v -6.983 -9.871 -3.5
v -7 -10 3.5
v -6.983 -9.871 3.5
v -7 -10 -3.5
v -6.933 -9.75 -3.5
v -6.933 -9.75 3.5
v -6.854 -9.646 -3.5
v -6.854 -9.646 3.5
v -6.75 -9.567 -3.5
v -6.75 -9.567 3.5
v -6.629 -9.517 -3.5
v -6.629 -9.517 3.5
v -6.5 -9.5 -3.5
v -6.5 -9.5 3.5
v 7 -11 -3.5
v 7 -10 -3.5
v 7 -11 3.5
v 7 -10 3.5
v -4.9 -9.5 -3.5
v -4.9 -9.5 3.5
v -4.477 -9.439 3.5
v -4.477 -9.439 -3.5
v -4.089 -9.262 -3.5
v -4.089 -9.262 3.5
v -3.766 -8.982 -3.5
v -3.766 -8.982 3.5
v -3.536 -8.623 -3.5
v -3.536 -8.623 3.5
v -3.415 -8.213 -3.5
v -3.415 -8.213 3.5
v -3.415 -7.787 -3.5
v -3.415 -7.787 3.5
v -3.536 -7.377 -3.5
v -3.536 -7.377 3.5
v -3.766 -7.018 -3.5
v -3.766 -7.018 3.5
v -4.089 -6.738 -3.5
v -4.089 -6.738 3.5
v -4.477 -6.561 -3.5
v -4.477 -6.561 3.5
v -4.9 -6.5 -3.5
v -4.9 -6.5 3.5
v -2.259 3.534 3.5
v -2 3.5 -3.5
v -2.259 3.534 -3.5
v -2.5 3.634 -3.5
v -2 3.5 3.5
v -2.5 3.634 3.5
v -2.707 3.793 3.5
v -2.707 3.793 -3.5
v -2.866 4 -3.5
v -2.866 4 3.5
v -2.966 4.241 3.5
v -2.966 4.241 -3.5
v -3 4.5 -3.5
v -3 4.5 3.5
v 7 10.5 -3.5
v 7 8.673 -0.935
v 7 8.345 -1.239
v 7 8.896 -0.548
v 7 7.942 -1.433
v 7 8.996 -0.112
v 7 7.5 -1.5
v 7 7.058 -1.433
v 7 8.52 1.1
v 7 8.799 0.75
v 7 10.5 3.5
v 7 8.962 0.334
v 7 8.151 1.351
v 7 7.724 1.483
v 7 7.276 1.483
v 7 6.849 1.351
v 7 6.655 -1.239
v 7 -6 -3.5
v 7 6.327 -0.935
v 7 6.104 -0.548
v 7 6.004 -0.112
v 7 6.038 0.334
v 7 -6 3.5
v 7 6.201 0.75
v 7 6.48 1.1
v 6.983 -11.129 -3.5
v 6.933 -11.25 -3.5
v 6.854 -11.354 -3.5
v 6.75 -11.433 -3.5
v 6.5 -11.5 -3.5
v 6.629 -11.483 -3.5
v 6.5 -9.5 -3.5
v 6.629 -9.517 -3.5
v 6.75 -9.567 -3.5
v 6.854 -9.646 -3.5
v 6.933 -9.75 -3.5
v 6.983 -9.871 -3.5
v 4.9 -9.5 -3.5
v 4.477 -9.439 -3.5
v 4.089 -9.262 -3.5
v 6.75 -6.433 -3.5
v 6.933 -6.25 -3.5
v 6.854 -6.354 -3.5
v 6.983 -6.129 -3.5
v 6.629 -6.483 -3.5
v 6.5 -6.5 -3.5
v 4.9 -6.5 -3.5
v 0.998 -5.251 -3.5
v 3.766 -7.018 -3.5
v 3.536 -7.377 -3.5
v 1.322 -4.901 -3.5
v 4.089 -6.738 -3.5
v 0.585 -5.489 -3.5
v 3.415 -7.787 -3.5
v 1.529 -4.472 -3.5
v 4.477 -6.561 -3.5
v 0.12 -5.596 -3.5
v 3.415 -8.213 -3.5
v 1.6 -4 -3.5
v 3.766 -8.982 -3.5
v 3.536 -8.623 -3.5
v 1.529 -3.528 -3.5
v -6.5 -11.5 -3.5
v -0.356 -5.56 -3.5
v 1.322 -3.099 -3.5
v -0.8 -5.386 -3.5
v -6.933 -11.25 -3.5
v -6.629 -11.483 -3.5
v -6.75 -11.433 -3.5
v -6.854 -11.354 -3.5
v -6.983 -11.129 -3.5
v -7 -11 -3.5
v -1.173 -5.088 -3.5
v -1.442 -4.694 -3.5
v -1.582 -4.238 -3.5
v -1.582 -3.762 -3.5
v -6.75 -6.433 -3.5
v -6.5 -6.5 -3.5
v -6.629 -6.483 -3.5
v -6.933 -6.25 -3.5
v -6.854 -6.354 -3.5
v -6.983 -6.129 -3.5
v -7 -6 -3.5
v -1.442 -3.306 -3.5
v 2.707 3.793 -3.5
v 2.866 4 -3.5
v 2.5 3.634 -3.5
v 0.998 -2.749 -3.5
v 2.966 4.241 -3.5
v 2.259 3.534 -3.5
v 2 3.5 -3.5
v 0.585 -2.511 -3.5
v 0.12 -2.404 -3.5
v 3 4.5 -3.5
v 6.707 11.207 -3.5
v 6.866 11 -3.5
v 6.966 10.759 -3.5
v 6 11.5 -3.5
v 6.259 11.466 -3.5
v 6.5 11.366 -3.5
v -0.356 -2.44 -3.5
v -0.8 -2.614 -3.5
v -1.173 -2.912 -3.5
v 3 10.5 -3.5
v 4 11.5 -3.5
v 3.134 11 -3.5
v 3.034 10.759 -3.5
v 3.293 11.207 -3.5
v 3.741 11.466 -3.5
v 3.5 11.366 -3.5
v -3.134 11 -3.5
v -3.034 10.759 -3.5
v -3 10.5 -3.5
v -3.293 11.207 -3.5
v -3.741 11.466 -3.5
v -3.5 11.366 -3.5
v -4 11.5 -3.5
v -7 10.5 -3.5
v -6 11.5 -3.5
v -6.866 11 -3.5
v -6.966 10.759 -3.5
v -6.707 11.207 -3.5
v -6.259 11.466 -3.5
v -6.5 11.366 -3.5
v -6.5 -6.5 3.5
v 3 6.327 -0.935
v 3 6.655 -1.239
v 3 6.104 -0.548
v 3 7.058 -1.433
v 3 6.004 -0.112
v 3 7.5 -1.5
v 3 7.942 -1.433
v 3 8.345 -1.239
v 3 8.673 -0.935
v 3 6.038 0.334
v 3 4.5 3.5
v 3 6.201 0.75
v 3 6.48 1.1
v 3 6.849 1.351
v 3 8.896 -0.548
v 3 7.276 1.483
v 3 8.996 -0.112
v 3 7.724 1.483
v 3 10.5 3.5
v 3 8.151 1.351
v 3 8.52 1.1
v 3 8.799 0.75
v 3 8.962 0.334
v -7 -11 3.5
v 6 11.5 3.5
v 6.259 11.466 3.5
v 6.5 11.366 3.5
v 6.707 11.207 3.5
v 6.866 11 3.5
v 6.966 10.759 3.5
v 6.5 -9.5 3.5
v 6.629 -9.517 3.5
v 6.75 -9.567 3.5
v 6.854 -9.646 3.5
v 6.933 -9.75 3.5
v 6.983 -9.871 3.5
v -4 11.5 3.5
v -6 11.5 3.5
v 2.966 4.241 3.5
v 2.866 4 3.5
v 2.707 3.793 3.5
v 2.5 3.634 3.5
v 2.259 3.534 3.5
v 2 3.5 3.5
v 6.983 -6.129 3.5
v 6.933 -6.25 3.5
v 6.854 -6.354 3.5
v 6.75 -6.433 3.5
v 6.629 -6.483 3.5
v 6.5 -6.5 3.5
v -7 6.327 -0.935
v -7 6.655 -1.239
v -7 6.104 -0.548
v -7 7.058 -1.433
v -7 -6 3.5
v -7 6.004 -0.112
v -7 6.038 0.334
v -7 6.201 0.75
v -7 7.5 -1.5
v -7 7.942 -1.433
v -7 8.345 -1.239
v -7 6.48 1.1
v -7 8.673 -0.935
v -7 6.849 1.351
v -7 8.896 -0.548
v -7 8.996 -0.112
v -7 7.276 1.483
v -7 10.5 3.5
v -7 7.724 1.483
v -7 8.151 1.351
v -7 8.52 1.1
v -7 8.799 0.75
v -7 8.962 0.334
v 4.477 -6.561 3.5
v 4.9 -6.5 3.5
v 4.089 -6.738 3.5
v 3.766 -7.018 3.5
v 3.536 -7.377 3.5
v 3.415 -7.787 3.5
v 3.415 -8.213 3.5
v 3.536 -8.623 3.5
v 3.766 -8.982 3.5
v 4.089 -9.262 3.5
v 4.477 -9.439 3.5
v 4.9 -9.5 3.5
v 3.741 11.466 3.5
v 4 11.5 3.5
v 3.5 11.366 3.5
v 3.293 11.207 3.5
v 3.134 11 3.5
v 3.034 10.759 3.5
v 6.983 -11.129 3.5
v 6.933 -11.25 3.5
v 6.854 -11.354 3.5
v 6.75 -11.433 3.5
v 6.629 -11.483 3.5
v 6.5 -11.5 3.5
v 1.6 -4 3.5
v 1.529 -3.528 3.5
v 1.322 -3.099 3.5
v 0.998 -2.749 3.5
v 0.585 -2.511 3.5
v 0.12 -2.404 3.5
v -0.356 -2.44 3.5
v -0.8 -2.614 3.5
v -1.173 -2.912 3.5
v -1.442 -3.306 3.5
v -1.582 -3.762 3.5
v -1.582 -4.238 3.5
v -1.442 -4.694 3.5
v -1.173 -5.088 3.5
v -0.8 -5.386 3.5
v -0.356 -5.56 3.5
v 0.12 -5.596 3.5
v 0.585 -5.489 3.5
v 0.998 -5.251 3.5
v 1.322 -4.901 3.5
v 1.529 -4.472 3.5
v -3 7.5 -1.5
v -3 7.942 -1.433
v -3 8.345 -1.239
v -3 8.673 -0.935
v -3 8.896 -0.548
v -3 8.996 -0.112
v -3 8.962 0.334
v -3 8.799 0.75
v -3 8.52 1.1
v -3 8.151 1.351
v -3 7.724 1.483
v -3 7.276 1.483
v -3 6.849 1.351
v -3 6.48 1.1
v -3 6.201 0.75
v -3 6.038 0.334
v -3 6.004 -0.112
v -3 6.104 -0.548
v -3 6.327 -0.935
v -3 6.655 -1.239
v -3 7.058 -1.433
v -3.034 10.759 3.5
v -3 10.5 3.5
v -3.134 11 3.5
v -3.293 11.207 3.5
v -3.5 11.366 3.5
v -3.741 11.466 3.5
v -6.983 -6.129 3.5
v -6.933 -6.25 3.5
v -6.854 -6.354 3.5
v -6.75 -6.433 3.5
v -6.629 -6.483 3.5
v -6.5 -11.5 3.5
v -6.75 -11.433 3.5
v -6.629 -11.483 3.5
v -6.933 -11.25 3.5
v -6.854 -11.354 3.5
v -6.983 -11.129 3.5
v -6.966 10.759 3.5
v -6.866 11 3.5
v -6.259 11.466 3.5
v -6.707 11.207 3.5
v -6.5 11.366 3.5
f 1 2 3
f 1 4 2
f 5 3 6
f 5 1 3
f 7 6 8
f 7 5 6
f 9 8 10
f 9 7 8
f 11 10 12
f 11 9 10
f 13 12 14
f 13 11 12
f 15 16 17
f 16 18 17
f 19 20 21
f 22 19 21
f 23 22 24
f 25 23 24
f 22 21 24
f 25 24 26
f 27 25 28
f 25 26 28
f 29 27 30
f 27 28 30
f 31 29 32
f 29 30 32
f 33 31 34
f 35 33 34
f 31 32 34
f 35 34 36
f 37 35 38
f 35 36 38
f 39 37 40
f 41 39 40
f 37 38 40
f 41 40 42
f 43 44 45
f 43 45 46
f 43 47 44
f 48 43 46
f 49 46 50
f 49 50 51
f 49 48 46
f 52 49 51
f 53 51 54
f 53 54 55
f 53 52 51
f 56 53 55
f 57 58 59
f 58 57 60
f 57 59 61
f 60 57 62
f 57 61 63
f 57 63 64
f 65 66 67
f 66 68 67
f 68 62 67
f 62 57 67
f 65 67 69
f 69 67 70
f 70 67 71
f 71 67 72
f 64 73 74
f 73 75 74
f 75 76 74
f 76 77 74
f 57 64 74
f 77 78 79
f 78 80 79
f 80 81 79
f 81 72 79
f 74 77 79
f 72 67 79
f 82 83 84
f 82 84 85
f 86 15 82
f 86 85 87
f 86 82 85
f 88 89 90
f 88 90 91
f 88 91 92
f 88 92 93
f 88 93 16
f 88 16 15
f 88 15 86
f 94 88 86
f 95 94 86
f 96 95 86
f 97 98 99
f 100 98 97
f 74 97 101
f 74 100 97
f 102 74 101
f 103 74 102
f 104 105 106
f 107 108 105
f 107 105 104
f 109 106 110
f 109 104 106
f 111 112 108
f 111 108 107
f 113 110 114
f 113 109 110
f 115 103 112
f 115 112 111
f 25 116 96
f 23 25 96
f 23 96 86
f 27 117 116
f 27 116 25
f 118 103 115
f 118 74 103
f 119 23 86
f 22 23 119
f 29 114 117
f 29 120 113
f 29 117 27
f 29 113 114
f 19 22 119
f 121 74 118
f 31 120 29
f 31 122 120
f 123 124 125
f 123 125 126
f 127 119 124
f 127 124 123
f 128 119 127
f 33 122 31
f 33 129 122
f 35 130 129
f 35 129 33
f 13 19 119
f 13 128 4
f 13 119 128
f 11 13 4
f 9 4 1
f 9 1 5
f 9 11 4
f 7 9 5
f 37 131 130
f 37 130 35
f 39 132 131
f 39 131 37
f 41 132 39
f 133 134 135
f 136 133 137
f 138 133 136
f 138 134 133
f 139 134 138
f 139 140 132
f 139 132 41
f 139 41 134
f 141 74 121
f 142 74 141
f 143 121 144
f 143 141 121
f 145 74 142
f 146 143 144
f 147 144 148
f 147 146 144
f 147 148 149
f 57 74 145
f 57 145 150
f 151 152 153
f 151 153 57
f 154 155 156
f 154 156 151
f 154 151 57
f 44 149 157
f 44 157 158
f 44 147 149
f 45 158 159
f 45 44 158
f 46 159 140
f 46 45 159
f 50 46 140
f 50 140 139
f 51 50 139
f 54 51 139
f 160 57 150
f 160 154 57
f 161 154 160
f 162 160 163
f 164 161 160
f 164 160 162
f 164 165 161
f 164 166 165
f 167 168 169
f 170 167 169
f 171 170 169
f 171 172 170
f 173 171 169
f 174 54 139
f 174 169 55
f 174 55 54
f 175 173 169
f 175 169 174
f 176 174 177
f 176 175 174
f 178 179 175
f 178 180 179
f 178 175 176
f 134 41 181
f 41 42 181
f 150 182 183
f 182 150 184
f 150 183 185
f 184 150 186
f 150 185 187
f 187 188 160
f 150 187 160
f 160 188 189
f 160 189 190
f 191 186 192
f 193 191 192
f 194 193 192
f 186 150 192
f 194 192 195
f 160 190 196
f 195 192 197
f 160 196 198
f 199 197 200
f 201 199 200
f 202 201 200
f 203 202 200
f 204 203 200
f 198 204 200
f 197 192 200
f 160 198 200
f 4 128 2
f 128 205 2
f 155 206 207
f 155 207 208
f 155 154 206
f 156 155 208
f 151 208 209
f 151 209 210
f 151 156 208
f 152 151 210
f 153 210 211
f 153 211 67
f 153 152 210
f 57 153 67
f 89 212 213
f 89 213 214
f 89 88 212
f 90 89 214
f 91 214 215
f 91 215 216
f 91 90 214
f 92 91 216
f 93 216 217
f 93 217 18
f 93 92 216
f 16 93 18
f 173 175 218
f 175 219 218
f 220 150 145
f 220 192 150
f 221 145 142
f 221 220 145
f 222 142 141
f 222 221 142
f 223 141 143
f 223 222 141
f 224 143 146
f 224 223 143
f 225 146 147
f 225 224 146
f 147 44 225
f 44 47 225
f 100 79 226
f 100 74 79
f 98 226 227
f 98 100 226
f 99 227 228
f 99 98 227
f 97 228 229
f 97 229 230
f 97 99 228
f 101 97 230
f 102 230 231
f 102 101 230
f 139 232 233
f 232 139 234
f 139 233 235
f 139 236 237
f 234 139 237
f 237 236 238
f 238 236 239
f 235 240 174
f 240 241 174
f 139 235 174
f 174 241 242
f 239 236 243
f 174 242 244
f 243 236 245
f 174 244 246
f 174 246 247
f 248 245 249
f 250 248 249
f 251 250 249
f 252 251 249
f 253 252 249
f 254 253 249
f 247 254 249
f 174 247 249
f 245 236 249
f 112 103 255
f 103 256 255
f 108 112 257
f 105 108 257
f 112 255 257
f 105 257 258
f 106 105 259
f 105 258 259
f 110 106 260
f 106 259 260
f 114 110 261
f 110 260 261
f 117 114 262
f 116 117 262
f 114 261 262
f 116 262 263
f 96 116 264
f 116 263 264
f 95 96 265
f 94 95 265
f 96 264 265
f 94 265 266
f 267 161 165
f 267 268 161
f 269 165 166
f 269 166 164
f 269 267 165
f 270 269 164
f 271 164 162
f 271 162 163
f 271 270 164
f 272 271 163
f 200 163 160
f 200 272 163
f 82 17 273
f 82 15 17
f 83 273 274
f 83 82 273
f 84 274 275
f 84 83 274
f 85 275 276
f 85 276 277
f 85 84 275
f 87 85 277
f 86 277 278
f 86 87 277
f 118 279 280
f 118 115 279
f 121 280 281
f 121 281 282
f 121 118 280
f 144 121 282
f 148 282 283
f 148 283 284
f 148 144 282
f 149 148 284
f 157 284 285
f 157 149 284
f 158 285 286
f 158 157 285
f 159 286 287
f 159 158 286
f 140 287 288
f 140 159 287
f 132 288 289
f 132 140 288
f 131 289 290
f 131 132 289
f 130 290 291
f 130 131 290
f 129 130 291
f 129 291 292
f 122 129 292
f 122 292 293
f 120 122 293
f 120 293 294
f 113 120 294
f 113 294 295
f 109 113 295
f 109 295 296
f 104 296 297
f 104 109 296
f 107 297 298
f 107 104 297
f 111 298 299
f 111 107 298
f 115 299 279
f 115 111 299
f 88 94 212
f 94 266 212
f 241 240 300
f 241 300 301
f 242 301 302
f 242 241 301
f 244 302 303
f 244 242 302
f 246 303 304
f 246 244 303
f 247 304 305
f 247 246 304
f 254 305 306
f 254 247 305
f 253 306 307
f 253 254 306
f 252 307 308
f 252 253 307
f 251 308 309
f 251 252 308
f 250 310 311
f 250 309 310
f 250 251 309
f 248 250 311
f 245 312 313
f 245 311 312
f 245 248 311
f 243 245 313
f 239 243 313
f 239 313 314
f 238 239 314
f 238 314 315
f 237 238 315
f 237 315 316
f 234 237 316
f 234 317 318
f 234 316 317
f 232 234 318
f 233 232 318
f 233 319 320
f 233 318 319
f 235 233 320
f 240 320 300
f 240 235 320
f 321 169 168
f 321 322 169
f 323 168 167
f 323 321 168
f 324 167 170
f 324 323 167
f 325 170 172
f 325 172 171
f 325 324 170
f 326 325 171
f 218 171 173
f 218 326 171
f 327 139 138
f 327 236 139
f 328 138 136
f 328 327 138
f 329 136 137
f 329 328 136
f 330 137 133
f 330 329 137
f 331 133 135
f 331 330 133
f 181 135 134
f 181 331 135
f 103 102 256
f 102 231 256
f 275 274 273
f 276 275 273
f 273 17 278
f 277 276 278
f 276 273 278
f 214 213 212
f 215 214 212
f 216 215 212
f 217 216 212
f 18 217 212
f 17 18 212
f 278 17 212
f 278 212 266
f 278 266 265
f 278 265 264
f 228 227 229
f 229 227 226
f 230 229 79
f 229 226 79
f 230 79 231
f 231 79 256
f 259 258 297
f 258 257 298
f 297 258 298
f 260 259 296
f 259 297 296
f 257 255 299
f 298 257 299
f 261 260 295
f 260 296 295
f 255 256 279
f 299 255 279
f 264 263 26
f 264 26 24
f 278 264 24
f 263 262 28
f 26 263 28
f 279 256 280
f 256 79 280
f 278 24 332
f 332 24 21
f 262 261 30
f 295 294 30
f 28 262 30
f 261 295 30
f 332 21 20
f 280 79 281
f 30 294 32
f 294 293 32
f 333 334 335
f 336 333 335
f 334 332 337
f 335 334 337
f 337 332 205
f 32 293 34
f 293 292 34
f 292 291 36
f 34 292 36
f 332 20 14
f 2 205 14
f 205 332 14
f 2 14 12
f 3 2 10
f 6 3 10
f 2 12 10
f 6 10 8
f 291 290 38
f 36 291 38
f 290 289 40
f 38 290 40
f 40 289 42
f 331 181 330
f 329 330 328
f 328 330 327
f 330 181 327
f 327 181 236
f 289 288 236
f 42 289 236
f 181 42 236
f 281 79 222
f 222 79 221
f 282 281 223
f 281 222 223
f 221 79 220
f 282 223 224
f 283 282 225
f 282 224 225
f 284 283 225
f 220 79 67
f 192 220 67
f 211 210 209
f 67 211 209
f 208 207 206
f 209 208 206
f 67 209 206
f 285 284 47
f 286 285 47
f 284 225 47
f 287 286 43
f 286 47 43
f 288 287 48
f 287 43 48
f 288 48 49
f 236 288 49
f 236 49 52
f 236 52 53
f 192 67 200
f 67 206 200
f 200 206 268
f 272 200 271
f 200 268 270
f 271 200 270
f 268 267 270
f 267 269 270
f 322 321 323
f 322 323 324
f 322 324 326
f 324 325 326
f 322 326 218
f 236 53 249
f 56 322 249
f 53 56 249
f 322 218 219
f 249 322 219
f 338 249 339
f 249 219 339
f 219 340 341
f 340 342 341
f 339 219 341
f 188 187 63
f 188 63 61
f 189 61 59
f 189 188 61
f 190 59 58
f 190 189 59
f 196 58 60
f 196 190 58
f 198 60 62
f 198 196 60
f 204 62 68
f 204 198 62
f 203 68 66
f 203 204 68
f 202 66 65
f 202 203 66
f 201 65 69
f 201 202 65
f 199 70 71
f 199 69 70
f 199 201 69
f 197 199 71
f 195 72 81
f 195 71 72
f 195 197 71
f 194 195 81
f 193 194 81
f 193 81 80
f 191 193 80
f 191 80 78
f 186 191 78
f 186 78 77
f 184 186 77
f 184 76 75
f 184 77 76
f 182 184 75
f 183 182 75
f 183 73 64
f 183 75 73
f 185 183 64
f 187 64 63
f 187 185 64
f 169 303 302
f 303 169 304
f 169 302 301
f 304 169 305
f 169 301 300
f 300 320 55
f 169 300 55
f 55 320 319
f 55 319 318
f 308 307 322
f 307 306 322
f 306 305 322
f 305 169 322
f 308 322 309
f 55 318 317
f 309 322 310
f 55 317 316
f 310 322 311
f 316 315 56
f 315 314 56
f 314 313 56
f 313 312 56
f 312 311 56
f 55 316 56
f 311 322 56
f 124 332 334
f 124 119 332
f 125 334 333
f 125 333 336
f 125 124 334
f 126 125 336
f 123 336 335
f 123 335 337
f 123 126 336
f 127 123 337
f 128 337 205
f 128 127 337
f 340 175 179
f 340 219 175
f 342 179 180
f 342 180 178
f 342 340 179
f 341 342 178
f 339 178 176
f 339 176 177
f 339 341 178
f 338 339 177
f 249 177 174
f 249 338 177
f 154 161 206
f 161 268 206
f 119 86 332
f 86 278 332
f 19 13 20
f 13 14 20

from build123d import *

# Parameters (mm, degrees)
CROQUIS1_R                 = 1.6
SALIENTE_EXTRUIR1_DEPTH    = 3.5
CORTAR_EXTRUIR1_DEPTH      = 14.910427743
CORTAR_EXTRUIR1_DEPTH_BACK = 14.910427743
CROQUIS2_R                 = 1.5
REDONDEO1_R                = 1
REDONDEO2_R                = 0.5


with BuildPart() as part:
    # Croquis1 → Saliente-Extruir1 (new, symmetric)
    with BuildSketch(Plane.XY):
        with BuildLine():
            Line((3, 11.5), (7, 11.5))
            Line((7, 11.5), (7, -6.5))
            Line((7, -6.5), (4.9, -6.5))
            ThreePointArc((4.9, -6.5), (3.4, -8), (4.9, -9.5))
            Line((4.9, -9.5), (7, -9.5))
            Line((7, -9.5), (7, -11.5))
            Line((7, -11.5), (-7, -11.5))
            Line((-7, -11.5), (-7, -9.5))
            Line((-7, -9.5), (-4.9, -9.5))
            ThreePointArc((-4.9, -9.5), (-3.4, -8), (-4.9, -6.5))
            Line((-4.9, -6.5), (-7, -6.5))
            Line((-7, -6.5), (-7, 11.5))
            Line((-7, 11.5), (-3, 11.5))
            Line((-3, 11.5), (-3, 3.5))
            Line((-3, 3.5), (3, 3.5))
            Line((3, 3.5), (3, 11.5))
        make_face()
        with Locations((0, -4)):
            Circle(CROQUIS1_R, mode=Mode.SUBTRACT)
    extrude(amount=SALIENTE_EXTRUIR1_DEPTH, both=True)

    # Croquis2 → Cortar-Extruir1 (cut, two sides: drawn at the far end of the back side and taken through both)
    with BuildSketch(Plane(origin=(0, 0, 0), x_dir=(0, 0, -1), z_dir=(1, 0, 0)).offset(-CORTAR_EXTRUIR1_DEPTH_BACK)):
        with Locations((0, 7.5)):
            Circle(CROQUIS2_R)
    extrude(amount=CORTAR_EXTRUIR1_DEPTH + CORTAR_EXTRUIR1_DEPTH_BACK, mode=Mode.SUBTRACT)

    # Redondeo1
    redondeo1_edges = [part.edges().sort_by_distance(p)[0] for p in [
        (-7, 11.5, 0),
        (-3, 11.5, 0),
        (-3, 3.5, 0),
        (3, 3.5, 0),
        (3, 11.5, 0),
        (7, 11.5, 0),
    ]]
    fillet(redondeo1_edges, radius=REDONDEO1_R)

    # Redondeo2
    redondeo2_edges = [part.edges().sort_by_distance(p)[0] for p in [
        (7, -11.5, 0),
        (-7, -11.5, 0),
        (-7, -9.5, 0),
        (-7, -6.5, 0),
        (7, -6.5, 0),
        (7, -9.5, 0),
    ]]
    fillet(redondeo2_edges, radius=REDONDEO2_R)


solid = part.part
